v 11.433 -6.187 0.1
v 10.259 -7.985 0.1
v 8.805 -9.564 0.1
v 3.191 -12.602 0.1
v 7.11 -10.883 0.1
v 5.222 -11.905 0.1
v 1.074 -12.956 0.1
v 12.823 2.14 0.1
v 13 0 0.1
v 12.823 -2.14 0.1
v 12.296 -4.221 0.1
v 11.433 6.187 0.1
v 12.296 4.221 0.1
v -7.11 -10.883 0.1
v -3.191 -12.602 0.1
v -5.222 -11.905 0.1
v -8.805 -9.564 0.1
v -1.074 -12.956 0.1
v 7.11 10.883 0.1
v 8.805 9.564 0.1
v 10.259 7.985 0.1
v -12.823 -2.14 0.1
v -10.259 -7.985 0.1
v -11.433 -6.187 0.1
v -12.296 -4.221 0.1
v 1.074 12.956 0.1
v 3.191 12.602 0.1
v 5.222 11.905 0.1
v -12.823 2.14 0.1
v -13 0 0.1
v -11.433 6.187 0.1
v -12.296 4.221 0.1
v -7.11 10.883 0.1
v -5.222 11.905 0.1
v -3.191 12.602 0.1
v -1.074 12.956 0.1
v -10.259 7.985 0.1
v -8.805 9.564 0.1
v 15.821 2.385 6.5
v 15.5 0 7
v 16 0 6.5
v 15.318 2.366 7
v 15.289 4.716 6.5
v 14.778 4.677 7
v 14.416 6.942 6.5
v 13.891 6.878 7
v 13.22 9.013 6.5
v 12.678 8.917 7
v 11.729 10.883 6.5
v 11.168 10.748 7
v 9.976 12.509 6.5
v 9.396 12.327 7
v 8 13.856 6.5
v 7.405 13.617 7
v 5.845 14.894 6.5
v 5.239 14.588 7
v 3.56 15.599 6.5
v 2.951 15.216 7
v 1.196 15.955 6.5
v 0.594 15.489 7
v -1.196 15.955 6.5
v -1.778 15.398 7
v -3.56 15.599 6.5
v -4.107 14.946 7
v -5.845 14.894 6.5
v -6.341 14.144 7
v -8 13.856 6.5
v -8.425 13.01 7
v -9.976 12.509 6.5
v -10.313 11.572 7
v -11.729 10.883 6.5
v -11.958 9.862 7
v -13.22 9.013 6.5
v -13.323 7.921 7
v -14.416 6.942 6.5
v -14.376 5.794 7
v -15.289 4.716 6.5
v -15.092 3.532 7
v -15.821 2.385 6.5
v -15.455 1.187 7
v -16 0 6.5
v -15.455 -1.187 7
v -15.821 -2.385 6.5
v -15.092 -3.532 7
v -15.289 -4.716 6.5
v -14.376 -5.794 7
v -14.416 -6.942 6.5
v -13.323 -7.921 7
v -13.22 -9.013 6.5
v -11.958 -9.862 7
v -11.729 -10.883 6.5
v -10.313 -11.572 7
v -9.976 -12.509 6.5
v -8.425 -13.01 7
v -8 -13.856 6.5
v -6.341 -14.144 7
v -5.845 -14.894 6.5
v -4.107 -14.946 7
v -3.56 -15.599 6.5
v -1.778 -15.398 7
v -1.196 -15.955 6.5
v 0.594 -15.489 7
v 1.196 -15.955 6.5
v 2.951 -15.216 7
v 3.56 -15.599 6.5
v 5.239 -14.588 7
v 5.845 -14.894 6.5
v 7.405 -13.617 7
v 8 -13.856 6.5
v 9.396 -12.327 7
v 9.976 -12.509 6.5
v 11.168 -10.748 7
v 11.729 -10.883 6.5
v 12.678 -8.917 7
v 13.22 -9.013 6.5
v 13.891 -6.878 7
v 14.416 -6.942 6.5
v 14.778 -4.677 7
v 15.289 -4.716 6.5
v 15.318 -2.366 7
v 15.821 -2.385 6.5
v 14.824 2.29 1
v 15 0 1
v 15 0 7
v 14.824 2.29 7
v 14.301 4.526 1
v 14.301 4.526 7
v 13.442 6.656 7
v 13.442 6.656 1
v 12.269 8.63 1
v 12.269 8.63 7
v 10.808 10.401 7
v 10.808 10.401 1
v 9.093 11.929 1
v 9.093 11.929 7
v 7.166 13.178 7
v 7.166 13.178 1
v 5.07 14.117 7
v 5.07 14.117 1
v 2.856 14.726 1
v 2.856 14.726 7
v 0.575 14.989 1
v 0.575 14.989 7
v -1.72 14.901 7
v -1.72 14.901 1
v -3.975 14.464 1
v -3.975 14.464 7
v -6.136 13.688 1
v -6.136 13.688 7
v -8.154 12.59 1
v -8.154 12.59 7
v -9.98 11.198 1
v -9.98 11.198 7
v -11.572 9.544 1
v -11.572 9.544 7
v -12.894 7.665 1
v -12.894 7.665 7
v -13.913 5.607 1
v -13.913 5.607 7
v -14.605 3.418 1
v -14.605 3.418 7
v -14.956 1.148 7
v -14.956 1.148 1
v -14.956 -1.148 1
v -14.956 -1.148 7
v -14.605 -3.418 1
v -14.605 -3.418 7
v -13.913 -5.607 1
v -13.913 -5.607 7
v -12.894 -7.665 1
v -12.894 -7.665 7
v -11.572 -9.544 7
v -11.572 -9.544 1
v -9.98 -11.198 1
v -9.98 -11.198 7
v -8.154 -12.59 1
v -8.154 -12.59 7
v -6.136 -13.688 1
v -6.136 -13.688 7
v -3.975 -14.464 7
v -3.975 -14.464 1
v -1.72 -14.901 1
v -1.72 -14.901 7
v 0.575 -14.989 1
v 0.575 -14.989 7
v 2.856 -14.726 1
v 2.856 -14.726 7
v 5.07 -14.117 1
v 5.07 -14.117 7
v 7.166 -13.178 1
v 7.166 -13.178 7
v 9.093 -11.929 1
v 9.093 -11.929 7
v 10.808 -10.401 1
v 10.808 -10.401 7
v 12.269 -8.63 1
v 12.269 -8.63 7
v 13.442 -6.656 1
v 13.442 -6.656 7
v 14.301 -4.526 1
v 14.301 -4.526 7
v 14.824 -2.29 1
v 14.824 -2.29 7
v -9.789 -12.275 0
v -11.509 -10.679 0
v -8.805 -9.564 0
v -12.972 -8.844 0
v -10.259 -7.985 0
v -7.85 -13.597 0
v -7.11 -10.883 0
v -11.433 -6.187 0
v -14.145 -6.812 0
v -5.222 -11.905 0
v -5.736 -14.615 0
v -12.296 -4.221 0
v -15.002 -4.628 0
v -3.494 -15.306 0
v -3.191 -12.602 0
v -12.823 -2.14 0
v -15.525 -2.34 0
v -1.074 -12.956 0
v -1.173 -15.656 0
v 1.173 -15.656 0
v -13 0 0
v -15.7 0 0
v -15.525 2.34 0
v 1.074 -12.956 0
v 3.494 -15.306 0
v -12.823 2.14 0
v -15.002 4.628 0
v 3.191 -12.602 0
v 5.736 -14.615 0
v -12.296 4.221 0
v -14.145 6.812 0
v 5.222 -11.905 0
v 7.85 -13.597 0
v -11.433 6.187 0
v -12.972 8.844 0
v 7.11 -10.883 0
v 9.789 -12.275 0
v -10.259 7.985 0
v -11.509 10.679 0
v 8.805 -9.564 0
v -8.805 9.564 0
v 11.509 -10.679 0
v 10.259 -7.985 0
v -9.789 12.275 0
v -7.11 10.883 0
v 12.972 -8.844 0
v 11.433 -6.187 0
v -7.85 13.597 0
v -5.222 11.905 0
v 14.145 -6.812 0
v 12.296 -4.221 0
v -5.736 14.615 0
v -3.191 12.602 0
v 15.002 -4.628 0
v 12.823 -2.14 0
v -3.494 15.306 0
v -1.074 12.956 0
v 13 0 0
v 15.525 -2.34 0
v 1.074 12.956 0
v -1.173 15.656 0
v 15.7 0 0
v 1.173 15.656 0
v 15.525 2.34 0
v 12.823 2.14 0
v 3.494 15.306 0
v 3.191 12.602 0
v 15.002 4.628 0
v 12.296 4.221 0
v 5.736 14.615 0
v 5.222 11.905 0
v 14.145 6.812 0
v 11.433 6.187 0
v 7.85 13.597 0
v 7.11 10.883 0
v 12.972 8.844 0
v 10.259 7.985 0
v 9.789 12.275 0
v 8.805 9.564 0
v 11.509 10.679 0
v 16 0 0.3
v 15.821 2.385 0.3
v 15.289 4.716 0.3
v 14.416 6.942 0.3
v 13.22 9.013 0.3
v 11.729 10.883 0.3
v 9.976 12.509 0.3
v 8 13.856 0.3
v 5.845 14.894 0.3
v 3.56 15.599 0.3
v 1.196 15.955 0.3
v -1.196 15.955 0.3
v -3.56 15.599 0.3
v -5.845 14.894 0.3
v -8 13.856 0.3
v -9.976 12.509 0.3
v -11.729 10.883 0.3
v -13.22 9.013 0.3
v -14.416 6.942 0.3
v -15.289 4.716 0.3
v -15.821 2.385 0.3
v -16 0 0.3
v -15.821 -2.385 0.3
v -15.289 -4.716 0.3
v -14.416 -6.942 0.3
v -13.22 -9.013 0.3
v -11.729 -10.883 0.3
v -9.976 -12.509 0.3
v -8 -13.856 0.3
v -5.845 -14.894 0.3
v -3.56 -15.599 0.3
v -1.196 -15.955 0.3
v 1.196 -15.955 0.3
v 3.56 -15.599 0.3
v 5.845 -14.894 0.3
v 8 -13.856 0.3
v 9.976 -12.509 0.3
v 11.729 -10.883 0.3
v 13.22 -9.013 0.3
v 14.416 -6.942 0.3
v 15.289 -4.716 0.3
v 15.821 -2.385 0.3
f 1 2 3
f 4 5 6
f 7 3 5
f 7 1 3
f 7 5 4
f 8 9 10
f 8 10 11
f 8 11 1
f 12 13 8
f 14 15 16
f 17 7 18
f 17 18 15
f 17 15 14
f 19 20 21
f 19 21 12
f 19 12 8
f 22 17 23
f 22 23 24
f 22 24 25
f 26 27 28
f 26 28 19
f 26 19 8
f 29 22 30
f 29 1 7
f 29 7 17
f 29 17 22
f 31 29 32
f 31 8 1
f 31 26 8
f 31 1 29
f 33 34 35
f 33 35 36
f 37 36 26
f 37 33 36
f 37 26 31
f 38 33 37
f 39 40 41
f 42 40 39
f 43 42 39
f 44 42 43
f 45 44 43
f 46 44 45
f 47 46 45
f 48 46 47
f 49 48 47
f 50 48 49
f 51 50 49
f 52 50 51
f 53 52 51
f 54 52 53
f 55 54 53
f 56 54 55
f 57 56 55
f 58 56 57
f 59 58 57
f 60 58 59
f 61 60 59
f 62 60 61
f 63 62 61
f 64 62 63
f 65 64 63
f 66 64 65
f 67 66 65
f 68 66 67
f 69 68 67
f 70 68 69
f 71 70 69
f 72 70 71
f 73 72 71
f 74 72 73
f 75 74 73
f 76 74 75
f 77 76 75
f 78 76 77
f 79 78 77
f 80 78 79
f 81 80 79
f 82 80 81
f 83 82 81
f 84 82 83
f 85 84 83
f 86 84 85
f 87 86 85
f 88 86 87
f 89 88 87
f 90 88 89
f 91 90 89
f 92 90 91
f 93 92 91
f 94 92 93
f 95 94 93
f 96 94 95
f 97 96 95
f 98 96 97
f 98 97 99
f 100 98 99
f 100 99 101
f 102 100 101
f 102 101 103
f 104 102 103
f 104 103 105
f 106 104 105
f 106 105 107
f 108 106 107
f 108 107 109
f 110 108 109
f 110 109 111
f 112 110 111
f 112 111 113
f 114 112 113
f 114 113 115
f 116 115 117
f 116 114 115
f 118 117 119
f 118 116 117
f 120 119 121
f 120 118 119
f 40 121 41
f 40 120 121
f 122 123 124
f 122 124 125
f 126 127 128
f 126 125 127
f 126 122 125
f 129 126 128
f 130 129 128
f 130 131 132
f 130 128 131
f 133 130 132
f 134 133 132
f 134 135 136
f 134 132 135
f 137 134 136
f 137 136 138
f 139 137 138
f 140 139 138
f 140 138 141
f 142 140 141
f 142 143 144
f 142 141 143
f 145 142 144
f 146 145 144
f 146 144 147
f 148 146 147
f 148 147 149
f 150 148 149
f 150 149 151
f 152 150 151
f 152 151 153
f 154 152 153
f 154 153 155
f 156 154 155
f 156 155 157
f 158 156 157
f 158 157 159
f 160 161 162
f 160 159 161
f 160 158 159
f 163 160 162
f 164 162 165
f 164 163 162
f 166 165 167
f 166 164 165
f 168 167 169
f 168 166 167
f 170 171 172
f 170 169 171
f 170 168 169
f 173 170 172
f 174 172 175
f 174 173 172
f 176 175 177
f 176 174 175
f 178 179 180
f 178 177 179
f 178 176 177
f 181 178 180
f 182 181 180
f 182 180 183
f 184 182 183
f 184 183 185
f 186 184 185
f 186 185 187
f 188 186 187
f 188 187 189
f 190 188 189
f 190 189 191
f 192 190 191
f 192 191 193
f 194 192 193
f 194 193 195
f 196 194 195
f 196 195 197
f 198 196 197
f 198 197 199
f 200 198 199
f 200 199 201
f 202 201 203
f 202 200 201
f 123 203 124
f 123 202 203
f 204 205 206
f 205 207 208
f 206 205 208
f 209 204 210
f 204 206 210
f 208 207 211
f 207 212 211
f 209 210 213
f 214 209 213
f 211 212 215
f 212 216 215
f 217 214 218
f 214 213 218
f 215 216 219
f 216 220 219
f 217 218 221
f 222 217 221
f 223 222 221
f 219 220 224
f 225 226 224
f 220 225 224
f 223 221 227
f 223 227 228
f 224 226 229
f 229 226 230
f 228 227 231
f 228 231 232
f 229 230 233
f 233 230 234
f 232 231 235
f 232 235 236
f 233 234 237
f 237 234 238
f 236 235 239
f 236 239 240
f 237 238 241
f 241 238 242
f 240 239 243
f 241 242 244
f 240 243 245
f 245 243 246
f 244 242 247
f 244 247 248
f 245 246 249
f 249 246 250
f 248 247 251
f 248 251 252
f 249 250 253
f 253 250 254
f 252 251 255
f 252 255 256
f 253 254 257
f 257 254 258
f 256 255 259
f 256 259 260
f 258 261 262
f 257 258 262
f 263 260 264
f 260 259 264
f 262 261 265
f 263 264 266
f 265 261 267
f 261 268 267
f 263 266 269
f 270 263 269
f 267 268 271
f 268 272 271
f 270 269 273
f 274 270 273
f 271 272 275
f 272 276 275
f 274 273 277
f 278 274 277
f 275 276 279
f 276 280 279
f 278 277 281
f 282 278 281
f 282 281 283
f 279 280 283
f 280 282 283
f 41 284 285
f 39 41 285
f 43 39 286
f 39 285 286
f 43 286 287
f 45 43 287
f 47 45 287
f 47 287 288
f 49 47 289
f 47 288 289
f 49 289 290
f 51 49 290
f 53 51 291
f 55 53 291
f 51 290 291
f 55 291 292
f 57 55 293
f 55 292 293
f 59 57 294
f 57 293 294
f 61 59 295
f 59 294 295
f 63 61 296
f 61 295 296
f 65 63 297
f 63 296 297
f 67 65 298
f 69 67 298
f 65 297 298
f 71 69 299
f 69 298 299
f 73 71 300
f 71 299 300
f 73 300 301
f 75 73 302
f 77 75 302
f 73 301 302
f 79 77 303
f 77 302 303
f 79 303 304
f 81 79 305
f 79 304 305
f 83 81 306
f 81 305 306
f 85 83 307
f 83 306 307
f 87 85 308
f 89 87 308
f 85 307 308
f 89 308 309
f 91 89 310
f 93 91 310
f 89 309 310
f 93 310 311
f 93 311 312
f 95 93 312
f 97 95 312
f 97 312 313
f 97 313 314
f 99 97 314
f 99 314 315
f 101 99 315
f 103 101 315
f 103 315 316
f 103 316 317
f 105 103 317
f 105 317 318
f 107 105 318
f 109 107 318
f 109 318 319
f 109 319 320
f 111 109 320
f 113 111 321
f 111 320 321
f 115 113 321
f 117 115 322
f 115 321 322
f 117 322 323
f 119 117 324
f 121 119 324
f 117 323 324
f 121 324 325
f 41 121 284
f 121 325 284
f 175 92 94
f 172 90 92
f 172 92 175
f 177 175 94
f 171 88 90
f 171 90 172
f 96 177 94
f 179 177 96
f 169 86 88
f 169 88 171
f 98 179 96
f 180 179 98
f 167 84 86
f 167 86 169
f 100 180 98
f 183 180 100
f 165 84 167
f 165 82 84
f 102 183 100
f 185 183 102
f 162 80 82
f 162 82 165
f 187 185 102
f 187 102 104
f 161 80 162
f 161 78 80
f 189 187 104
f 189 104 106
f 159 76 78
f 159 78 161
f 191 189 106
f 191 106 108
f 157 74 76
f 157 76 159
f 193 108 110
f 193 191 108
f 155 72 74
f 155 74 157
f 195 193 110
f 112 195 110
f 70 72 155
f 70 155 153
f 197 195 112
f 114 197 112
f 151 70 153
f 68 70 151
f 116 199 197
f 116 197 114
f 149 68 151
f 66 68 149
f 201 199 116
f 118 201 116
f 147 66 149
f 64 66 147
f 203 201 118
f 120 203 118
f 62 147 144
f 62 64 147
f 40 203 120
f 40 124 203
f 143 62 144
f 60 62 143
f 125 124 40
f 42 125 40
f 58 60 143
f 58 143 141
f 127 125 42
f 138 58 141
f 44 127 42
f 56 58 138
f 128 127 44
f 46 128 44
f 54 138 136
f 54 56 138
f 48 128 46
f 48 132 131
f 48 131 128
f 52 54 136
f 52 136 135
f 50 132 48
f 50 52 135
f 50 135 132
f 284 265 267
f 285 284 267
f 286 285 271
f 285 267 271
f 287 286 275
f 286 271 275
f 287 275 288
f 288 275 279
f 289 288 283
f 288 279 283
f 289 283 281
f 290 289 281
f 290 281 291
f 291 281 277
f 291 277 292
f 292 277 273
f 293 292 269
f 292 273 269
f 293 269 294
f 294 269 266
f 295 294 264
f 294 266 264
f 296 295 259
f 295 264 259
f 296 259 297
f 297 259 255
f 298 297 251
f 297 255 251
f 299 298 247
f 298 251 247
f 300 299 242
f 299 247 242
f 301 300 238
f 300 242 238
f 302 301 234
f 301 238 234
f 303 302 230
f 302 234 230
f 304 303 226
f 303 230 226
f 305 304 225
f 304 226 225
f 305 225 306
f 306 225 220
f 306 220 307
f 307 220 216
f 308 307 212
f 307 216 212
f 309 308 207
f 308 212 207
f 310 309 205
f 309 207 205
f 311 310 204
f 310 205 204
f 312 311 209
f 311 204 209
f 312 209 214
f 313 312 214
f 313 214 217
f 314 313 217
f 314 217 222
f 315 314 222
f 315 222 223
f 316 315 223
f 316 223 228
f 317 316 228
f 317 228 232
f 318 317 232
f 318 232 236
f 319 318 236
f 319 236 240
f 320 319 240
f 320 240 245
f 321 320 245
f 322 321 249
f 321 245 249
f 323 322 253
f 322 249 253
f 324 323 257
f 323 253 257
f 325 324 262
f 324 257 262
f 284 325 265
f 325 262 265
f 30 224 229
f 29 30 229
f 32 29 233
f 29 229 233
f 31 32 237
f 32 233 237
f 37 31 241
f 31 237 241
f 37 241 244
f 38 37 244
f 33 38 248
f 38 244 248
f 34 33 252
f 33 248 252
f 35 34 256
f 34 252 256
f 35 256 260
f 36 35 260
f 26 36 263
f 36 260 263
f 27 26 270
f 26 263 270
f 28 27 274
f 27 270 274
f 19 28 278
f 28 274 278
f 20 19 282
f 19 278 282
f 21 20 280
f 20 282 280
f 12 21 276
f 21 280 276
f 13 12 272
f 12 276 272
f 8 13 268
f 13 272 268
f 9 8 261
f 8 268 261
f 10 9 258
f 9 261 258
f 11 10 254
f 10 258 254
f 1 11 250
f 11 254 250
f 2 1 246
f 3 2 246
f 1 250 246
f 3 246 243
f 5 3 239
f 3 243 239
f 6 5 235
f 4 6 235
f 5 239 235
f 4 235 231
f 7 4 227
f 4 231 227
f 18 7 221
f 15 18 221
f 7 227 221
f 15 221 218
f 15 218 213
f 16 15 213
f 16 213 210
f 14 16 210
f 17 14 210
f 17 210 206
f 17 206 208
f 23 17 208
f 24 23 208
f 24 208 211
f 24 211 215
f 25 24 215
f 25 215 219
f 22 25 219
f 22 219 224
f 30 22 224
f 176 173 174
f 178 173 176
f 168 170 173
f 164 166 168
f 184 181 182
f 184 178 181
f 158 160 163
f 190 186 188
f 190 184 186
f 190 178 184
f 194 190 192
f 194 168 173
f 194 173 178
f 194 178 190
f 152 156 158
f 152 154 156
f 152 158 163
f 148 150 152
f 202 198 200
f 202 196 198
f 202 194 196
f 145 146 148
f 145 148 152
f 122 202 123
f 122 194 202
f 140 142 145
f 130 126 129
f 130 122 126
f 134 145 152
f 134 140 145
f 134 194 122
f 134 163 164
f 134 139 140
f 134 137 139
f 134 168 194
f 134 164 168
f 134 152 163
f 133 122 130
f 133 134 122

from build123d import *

# Parameters (mm, degrees)
SKICA1_R                 = 16
P_IDAT_VYSUNUT_M1_DEPTH  = 7
SKO_EPINA1_T             = -1
SKICA2_R                 = 13
ODEBRAT_VYSUNUT_M1_DEPTH = 0.1
ZKOSEN_1_SIZE            = 0.5
ZKOSEN_2_SIZE            = 0.3


with BuildPart() as part:
    # Skica1 → Přidat vysunutím1 (new body)
    with BuildSketch(Plane.XY):
        Circle(SKICA1_R)
    extrude(amount=P_IDAT_VYSUNUT_M1_DEPTH)

    # Skořepina1
    sko_epina1_openings = [part.faces().sort_by_distance(p)[0] for p in [
        (0, 0, 7),
    ]]
    offset(amount=SKO_EPINA1_T, openings=sko_epina1_openings, kind=Kind.INTERSECTION)

    # Skica2 → Odebrat vysunutím1 (cut)
    with BuildSketch(Plane(origin=(0, 0, 0), x_dir=(-1, 0, 0), z_dir=(0, 0, -1))):
        Circle(SKICA2_R)
    extrude(amount=-ODEBRAT_VYSUNUT_M1_DEPTH, mode=Mode.SUBTRACT)

    # Zkosení1
    zkosen_1_edges = [part.edges().sort_by_distance(p)[0] for p in [
        (-16, 0, 7),
    ]]
    chamfer(zkosen_1_edges, length=ZKOSEN_1_SIZE)

    # Zkosení2
    zkosen_2_edges = [part.edges().sort_by_distance(p)[0] for p in [
        (-16, 0, 0),
    ]]
    chamfer(zkosen_2_edges, length=ZKOSEN_2_SIZE)


solid = part.part
